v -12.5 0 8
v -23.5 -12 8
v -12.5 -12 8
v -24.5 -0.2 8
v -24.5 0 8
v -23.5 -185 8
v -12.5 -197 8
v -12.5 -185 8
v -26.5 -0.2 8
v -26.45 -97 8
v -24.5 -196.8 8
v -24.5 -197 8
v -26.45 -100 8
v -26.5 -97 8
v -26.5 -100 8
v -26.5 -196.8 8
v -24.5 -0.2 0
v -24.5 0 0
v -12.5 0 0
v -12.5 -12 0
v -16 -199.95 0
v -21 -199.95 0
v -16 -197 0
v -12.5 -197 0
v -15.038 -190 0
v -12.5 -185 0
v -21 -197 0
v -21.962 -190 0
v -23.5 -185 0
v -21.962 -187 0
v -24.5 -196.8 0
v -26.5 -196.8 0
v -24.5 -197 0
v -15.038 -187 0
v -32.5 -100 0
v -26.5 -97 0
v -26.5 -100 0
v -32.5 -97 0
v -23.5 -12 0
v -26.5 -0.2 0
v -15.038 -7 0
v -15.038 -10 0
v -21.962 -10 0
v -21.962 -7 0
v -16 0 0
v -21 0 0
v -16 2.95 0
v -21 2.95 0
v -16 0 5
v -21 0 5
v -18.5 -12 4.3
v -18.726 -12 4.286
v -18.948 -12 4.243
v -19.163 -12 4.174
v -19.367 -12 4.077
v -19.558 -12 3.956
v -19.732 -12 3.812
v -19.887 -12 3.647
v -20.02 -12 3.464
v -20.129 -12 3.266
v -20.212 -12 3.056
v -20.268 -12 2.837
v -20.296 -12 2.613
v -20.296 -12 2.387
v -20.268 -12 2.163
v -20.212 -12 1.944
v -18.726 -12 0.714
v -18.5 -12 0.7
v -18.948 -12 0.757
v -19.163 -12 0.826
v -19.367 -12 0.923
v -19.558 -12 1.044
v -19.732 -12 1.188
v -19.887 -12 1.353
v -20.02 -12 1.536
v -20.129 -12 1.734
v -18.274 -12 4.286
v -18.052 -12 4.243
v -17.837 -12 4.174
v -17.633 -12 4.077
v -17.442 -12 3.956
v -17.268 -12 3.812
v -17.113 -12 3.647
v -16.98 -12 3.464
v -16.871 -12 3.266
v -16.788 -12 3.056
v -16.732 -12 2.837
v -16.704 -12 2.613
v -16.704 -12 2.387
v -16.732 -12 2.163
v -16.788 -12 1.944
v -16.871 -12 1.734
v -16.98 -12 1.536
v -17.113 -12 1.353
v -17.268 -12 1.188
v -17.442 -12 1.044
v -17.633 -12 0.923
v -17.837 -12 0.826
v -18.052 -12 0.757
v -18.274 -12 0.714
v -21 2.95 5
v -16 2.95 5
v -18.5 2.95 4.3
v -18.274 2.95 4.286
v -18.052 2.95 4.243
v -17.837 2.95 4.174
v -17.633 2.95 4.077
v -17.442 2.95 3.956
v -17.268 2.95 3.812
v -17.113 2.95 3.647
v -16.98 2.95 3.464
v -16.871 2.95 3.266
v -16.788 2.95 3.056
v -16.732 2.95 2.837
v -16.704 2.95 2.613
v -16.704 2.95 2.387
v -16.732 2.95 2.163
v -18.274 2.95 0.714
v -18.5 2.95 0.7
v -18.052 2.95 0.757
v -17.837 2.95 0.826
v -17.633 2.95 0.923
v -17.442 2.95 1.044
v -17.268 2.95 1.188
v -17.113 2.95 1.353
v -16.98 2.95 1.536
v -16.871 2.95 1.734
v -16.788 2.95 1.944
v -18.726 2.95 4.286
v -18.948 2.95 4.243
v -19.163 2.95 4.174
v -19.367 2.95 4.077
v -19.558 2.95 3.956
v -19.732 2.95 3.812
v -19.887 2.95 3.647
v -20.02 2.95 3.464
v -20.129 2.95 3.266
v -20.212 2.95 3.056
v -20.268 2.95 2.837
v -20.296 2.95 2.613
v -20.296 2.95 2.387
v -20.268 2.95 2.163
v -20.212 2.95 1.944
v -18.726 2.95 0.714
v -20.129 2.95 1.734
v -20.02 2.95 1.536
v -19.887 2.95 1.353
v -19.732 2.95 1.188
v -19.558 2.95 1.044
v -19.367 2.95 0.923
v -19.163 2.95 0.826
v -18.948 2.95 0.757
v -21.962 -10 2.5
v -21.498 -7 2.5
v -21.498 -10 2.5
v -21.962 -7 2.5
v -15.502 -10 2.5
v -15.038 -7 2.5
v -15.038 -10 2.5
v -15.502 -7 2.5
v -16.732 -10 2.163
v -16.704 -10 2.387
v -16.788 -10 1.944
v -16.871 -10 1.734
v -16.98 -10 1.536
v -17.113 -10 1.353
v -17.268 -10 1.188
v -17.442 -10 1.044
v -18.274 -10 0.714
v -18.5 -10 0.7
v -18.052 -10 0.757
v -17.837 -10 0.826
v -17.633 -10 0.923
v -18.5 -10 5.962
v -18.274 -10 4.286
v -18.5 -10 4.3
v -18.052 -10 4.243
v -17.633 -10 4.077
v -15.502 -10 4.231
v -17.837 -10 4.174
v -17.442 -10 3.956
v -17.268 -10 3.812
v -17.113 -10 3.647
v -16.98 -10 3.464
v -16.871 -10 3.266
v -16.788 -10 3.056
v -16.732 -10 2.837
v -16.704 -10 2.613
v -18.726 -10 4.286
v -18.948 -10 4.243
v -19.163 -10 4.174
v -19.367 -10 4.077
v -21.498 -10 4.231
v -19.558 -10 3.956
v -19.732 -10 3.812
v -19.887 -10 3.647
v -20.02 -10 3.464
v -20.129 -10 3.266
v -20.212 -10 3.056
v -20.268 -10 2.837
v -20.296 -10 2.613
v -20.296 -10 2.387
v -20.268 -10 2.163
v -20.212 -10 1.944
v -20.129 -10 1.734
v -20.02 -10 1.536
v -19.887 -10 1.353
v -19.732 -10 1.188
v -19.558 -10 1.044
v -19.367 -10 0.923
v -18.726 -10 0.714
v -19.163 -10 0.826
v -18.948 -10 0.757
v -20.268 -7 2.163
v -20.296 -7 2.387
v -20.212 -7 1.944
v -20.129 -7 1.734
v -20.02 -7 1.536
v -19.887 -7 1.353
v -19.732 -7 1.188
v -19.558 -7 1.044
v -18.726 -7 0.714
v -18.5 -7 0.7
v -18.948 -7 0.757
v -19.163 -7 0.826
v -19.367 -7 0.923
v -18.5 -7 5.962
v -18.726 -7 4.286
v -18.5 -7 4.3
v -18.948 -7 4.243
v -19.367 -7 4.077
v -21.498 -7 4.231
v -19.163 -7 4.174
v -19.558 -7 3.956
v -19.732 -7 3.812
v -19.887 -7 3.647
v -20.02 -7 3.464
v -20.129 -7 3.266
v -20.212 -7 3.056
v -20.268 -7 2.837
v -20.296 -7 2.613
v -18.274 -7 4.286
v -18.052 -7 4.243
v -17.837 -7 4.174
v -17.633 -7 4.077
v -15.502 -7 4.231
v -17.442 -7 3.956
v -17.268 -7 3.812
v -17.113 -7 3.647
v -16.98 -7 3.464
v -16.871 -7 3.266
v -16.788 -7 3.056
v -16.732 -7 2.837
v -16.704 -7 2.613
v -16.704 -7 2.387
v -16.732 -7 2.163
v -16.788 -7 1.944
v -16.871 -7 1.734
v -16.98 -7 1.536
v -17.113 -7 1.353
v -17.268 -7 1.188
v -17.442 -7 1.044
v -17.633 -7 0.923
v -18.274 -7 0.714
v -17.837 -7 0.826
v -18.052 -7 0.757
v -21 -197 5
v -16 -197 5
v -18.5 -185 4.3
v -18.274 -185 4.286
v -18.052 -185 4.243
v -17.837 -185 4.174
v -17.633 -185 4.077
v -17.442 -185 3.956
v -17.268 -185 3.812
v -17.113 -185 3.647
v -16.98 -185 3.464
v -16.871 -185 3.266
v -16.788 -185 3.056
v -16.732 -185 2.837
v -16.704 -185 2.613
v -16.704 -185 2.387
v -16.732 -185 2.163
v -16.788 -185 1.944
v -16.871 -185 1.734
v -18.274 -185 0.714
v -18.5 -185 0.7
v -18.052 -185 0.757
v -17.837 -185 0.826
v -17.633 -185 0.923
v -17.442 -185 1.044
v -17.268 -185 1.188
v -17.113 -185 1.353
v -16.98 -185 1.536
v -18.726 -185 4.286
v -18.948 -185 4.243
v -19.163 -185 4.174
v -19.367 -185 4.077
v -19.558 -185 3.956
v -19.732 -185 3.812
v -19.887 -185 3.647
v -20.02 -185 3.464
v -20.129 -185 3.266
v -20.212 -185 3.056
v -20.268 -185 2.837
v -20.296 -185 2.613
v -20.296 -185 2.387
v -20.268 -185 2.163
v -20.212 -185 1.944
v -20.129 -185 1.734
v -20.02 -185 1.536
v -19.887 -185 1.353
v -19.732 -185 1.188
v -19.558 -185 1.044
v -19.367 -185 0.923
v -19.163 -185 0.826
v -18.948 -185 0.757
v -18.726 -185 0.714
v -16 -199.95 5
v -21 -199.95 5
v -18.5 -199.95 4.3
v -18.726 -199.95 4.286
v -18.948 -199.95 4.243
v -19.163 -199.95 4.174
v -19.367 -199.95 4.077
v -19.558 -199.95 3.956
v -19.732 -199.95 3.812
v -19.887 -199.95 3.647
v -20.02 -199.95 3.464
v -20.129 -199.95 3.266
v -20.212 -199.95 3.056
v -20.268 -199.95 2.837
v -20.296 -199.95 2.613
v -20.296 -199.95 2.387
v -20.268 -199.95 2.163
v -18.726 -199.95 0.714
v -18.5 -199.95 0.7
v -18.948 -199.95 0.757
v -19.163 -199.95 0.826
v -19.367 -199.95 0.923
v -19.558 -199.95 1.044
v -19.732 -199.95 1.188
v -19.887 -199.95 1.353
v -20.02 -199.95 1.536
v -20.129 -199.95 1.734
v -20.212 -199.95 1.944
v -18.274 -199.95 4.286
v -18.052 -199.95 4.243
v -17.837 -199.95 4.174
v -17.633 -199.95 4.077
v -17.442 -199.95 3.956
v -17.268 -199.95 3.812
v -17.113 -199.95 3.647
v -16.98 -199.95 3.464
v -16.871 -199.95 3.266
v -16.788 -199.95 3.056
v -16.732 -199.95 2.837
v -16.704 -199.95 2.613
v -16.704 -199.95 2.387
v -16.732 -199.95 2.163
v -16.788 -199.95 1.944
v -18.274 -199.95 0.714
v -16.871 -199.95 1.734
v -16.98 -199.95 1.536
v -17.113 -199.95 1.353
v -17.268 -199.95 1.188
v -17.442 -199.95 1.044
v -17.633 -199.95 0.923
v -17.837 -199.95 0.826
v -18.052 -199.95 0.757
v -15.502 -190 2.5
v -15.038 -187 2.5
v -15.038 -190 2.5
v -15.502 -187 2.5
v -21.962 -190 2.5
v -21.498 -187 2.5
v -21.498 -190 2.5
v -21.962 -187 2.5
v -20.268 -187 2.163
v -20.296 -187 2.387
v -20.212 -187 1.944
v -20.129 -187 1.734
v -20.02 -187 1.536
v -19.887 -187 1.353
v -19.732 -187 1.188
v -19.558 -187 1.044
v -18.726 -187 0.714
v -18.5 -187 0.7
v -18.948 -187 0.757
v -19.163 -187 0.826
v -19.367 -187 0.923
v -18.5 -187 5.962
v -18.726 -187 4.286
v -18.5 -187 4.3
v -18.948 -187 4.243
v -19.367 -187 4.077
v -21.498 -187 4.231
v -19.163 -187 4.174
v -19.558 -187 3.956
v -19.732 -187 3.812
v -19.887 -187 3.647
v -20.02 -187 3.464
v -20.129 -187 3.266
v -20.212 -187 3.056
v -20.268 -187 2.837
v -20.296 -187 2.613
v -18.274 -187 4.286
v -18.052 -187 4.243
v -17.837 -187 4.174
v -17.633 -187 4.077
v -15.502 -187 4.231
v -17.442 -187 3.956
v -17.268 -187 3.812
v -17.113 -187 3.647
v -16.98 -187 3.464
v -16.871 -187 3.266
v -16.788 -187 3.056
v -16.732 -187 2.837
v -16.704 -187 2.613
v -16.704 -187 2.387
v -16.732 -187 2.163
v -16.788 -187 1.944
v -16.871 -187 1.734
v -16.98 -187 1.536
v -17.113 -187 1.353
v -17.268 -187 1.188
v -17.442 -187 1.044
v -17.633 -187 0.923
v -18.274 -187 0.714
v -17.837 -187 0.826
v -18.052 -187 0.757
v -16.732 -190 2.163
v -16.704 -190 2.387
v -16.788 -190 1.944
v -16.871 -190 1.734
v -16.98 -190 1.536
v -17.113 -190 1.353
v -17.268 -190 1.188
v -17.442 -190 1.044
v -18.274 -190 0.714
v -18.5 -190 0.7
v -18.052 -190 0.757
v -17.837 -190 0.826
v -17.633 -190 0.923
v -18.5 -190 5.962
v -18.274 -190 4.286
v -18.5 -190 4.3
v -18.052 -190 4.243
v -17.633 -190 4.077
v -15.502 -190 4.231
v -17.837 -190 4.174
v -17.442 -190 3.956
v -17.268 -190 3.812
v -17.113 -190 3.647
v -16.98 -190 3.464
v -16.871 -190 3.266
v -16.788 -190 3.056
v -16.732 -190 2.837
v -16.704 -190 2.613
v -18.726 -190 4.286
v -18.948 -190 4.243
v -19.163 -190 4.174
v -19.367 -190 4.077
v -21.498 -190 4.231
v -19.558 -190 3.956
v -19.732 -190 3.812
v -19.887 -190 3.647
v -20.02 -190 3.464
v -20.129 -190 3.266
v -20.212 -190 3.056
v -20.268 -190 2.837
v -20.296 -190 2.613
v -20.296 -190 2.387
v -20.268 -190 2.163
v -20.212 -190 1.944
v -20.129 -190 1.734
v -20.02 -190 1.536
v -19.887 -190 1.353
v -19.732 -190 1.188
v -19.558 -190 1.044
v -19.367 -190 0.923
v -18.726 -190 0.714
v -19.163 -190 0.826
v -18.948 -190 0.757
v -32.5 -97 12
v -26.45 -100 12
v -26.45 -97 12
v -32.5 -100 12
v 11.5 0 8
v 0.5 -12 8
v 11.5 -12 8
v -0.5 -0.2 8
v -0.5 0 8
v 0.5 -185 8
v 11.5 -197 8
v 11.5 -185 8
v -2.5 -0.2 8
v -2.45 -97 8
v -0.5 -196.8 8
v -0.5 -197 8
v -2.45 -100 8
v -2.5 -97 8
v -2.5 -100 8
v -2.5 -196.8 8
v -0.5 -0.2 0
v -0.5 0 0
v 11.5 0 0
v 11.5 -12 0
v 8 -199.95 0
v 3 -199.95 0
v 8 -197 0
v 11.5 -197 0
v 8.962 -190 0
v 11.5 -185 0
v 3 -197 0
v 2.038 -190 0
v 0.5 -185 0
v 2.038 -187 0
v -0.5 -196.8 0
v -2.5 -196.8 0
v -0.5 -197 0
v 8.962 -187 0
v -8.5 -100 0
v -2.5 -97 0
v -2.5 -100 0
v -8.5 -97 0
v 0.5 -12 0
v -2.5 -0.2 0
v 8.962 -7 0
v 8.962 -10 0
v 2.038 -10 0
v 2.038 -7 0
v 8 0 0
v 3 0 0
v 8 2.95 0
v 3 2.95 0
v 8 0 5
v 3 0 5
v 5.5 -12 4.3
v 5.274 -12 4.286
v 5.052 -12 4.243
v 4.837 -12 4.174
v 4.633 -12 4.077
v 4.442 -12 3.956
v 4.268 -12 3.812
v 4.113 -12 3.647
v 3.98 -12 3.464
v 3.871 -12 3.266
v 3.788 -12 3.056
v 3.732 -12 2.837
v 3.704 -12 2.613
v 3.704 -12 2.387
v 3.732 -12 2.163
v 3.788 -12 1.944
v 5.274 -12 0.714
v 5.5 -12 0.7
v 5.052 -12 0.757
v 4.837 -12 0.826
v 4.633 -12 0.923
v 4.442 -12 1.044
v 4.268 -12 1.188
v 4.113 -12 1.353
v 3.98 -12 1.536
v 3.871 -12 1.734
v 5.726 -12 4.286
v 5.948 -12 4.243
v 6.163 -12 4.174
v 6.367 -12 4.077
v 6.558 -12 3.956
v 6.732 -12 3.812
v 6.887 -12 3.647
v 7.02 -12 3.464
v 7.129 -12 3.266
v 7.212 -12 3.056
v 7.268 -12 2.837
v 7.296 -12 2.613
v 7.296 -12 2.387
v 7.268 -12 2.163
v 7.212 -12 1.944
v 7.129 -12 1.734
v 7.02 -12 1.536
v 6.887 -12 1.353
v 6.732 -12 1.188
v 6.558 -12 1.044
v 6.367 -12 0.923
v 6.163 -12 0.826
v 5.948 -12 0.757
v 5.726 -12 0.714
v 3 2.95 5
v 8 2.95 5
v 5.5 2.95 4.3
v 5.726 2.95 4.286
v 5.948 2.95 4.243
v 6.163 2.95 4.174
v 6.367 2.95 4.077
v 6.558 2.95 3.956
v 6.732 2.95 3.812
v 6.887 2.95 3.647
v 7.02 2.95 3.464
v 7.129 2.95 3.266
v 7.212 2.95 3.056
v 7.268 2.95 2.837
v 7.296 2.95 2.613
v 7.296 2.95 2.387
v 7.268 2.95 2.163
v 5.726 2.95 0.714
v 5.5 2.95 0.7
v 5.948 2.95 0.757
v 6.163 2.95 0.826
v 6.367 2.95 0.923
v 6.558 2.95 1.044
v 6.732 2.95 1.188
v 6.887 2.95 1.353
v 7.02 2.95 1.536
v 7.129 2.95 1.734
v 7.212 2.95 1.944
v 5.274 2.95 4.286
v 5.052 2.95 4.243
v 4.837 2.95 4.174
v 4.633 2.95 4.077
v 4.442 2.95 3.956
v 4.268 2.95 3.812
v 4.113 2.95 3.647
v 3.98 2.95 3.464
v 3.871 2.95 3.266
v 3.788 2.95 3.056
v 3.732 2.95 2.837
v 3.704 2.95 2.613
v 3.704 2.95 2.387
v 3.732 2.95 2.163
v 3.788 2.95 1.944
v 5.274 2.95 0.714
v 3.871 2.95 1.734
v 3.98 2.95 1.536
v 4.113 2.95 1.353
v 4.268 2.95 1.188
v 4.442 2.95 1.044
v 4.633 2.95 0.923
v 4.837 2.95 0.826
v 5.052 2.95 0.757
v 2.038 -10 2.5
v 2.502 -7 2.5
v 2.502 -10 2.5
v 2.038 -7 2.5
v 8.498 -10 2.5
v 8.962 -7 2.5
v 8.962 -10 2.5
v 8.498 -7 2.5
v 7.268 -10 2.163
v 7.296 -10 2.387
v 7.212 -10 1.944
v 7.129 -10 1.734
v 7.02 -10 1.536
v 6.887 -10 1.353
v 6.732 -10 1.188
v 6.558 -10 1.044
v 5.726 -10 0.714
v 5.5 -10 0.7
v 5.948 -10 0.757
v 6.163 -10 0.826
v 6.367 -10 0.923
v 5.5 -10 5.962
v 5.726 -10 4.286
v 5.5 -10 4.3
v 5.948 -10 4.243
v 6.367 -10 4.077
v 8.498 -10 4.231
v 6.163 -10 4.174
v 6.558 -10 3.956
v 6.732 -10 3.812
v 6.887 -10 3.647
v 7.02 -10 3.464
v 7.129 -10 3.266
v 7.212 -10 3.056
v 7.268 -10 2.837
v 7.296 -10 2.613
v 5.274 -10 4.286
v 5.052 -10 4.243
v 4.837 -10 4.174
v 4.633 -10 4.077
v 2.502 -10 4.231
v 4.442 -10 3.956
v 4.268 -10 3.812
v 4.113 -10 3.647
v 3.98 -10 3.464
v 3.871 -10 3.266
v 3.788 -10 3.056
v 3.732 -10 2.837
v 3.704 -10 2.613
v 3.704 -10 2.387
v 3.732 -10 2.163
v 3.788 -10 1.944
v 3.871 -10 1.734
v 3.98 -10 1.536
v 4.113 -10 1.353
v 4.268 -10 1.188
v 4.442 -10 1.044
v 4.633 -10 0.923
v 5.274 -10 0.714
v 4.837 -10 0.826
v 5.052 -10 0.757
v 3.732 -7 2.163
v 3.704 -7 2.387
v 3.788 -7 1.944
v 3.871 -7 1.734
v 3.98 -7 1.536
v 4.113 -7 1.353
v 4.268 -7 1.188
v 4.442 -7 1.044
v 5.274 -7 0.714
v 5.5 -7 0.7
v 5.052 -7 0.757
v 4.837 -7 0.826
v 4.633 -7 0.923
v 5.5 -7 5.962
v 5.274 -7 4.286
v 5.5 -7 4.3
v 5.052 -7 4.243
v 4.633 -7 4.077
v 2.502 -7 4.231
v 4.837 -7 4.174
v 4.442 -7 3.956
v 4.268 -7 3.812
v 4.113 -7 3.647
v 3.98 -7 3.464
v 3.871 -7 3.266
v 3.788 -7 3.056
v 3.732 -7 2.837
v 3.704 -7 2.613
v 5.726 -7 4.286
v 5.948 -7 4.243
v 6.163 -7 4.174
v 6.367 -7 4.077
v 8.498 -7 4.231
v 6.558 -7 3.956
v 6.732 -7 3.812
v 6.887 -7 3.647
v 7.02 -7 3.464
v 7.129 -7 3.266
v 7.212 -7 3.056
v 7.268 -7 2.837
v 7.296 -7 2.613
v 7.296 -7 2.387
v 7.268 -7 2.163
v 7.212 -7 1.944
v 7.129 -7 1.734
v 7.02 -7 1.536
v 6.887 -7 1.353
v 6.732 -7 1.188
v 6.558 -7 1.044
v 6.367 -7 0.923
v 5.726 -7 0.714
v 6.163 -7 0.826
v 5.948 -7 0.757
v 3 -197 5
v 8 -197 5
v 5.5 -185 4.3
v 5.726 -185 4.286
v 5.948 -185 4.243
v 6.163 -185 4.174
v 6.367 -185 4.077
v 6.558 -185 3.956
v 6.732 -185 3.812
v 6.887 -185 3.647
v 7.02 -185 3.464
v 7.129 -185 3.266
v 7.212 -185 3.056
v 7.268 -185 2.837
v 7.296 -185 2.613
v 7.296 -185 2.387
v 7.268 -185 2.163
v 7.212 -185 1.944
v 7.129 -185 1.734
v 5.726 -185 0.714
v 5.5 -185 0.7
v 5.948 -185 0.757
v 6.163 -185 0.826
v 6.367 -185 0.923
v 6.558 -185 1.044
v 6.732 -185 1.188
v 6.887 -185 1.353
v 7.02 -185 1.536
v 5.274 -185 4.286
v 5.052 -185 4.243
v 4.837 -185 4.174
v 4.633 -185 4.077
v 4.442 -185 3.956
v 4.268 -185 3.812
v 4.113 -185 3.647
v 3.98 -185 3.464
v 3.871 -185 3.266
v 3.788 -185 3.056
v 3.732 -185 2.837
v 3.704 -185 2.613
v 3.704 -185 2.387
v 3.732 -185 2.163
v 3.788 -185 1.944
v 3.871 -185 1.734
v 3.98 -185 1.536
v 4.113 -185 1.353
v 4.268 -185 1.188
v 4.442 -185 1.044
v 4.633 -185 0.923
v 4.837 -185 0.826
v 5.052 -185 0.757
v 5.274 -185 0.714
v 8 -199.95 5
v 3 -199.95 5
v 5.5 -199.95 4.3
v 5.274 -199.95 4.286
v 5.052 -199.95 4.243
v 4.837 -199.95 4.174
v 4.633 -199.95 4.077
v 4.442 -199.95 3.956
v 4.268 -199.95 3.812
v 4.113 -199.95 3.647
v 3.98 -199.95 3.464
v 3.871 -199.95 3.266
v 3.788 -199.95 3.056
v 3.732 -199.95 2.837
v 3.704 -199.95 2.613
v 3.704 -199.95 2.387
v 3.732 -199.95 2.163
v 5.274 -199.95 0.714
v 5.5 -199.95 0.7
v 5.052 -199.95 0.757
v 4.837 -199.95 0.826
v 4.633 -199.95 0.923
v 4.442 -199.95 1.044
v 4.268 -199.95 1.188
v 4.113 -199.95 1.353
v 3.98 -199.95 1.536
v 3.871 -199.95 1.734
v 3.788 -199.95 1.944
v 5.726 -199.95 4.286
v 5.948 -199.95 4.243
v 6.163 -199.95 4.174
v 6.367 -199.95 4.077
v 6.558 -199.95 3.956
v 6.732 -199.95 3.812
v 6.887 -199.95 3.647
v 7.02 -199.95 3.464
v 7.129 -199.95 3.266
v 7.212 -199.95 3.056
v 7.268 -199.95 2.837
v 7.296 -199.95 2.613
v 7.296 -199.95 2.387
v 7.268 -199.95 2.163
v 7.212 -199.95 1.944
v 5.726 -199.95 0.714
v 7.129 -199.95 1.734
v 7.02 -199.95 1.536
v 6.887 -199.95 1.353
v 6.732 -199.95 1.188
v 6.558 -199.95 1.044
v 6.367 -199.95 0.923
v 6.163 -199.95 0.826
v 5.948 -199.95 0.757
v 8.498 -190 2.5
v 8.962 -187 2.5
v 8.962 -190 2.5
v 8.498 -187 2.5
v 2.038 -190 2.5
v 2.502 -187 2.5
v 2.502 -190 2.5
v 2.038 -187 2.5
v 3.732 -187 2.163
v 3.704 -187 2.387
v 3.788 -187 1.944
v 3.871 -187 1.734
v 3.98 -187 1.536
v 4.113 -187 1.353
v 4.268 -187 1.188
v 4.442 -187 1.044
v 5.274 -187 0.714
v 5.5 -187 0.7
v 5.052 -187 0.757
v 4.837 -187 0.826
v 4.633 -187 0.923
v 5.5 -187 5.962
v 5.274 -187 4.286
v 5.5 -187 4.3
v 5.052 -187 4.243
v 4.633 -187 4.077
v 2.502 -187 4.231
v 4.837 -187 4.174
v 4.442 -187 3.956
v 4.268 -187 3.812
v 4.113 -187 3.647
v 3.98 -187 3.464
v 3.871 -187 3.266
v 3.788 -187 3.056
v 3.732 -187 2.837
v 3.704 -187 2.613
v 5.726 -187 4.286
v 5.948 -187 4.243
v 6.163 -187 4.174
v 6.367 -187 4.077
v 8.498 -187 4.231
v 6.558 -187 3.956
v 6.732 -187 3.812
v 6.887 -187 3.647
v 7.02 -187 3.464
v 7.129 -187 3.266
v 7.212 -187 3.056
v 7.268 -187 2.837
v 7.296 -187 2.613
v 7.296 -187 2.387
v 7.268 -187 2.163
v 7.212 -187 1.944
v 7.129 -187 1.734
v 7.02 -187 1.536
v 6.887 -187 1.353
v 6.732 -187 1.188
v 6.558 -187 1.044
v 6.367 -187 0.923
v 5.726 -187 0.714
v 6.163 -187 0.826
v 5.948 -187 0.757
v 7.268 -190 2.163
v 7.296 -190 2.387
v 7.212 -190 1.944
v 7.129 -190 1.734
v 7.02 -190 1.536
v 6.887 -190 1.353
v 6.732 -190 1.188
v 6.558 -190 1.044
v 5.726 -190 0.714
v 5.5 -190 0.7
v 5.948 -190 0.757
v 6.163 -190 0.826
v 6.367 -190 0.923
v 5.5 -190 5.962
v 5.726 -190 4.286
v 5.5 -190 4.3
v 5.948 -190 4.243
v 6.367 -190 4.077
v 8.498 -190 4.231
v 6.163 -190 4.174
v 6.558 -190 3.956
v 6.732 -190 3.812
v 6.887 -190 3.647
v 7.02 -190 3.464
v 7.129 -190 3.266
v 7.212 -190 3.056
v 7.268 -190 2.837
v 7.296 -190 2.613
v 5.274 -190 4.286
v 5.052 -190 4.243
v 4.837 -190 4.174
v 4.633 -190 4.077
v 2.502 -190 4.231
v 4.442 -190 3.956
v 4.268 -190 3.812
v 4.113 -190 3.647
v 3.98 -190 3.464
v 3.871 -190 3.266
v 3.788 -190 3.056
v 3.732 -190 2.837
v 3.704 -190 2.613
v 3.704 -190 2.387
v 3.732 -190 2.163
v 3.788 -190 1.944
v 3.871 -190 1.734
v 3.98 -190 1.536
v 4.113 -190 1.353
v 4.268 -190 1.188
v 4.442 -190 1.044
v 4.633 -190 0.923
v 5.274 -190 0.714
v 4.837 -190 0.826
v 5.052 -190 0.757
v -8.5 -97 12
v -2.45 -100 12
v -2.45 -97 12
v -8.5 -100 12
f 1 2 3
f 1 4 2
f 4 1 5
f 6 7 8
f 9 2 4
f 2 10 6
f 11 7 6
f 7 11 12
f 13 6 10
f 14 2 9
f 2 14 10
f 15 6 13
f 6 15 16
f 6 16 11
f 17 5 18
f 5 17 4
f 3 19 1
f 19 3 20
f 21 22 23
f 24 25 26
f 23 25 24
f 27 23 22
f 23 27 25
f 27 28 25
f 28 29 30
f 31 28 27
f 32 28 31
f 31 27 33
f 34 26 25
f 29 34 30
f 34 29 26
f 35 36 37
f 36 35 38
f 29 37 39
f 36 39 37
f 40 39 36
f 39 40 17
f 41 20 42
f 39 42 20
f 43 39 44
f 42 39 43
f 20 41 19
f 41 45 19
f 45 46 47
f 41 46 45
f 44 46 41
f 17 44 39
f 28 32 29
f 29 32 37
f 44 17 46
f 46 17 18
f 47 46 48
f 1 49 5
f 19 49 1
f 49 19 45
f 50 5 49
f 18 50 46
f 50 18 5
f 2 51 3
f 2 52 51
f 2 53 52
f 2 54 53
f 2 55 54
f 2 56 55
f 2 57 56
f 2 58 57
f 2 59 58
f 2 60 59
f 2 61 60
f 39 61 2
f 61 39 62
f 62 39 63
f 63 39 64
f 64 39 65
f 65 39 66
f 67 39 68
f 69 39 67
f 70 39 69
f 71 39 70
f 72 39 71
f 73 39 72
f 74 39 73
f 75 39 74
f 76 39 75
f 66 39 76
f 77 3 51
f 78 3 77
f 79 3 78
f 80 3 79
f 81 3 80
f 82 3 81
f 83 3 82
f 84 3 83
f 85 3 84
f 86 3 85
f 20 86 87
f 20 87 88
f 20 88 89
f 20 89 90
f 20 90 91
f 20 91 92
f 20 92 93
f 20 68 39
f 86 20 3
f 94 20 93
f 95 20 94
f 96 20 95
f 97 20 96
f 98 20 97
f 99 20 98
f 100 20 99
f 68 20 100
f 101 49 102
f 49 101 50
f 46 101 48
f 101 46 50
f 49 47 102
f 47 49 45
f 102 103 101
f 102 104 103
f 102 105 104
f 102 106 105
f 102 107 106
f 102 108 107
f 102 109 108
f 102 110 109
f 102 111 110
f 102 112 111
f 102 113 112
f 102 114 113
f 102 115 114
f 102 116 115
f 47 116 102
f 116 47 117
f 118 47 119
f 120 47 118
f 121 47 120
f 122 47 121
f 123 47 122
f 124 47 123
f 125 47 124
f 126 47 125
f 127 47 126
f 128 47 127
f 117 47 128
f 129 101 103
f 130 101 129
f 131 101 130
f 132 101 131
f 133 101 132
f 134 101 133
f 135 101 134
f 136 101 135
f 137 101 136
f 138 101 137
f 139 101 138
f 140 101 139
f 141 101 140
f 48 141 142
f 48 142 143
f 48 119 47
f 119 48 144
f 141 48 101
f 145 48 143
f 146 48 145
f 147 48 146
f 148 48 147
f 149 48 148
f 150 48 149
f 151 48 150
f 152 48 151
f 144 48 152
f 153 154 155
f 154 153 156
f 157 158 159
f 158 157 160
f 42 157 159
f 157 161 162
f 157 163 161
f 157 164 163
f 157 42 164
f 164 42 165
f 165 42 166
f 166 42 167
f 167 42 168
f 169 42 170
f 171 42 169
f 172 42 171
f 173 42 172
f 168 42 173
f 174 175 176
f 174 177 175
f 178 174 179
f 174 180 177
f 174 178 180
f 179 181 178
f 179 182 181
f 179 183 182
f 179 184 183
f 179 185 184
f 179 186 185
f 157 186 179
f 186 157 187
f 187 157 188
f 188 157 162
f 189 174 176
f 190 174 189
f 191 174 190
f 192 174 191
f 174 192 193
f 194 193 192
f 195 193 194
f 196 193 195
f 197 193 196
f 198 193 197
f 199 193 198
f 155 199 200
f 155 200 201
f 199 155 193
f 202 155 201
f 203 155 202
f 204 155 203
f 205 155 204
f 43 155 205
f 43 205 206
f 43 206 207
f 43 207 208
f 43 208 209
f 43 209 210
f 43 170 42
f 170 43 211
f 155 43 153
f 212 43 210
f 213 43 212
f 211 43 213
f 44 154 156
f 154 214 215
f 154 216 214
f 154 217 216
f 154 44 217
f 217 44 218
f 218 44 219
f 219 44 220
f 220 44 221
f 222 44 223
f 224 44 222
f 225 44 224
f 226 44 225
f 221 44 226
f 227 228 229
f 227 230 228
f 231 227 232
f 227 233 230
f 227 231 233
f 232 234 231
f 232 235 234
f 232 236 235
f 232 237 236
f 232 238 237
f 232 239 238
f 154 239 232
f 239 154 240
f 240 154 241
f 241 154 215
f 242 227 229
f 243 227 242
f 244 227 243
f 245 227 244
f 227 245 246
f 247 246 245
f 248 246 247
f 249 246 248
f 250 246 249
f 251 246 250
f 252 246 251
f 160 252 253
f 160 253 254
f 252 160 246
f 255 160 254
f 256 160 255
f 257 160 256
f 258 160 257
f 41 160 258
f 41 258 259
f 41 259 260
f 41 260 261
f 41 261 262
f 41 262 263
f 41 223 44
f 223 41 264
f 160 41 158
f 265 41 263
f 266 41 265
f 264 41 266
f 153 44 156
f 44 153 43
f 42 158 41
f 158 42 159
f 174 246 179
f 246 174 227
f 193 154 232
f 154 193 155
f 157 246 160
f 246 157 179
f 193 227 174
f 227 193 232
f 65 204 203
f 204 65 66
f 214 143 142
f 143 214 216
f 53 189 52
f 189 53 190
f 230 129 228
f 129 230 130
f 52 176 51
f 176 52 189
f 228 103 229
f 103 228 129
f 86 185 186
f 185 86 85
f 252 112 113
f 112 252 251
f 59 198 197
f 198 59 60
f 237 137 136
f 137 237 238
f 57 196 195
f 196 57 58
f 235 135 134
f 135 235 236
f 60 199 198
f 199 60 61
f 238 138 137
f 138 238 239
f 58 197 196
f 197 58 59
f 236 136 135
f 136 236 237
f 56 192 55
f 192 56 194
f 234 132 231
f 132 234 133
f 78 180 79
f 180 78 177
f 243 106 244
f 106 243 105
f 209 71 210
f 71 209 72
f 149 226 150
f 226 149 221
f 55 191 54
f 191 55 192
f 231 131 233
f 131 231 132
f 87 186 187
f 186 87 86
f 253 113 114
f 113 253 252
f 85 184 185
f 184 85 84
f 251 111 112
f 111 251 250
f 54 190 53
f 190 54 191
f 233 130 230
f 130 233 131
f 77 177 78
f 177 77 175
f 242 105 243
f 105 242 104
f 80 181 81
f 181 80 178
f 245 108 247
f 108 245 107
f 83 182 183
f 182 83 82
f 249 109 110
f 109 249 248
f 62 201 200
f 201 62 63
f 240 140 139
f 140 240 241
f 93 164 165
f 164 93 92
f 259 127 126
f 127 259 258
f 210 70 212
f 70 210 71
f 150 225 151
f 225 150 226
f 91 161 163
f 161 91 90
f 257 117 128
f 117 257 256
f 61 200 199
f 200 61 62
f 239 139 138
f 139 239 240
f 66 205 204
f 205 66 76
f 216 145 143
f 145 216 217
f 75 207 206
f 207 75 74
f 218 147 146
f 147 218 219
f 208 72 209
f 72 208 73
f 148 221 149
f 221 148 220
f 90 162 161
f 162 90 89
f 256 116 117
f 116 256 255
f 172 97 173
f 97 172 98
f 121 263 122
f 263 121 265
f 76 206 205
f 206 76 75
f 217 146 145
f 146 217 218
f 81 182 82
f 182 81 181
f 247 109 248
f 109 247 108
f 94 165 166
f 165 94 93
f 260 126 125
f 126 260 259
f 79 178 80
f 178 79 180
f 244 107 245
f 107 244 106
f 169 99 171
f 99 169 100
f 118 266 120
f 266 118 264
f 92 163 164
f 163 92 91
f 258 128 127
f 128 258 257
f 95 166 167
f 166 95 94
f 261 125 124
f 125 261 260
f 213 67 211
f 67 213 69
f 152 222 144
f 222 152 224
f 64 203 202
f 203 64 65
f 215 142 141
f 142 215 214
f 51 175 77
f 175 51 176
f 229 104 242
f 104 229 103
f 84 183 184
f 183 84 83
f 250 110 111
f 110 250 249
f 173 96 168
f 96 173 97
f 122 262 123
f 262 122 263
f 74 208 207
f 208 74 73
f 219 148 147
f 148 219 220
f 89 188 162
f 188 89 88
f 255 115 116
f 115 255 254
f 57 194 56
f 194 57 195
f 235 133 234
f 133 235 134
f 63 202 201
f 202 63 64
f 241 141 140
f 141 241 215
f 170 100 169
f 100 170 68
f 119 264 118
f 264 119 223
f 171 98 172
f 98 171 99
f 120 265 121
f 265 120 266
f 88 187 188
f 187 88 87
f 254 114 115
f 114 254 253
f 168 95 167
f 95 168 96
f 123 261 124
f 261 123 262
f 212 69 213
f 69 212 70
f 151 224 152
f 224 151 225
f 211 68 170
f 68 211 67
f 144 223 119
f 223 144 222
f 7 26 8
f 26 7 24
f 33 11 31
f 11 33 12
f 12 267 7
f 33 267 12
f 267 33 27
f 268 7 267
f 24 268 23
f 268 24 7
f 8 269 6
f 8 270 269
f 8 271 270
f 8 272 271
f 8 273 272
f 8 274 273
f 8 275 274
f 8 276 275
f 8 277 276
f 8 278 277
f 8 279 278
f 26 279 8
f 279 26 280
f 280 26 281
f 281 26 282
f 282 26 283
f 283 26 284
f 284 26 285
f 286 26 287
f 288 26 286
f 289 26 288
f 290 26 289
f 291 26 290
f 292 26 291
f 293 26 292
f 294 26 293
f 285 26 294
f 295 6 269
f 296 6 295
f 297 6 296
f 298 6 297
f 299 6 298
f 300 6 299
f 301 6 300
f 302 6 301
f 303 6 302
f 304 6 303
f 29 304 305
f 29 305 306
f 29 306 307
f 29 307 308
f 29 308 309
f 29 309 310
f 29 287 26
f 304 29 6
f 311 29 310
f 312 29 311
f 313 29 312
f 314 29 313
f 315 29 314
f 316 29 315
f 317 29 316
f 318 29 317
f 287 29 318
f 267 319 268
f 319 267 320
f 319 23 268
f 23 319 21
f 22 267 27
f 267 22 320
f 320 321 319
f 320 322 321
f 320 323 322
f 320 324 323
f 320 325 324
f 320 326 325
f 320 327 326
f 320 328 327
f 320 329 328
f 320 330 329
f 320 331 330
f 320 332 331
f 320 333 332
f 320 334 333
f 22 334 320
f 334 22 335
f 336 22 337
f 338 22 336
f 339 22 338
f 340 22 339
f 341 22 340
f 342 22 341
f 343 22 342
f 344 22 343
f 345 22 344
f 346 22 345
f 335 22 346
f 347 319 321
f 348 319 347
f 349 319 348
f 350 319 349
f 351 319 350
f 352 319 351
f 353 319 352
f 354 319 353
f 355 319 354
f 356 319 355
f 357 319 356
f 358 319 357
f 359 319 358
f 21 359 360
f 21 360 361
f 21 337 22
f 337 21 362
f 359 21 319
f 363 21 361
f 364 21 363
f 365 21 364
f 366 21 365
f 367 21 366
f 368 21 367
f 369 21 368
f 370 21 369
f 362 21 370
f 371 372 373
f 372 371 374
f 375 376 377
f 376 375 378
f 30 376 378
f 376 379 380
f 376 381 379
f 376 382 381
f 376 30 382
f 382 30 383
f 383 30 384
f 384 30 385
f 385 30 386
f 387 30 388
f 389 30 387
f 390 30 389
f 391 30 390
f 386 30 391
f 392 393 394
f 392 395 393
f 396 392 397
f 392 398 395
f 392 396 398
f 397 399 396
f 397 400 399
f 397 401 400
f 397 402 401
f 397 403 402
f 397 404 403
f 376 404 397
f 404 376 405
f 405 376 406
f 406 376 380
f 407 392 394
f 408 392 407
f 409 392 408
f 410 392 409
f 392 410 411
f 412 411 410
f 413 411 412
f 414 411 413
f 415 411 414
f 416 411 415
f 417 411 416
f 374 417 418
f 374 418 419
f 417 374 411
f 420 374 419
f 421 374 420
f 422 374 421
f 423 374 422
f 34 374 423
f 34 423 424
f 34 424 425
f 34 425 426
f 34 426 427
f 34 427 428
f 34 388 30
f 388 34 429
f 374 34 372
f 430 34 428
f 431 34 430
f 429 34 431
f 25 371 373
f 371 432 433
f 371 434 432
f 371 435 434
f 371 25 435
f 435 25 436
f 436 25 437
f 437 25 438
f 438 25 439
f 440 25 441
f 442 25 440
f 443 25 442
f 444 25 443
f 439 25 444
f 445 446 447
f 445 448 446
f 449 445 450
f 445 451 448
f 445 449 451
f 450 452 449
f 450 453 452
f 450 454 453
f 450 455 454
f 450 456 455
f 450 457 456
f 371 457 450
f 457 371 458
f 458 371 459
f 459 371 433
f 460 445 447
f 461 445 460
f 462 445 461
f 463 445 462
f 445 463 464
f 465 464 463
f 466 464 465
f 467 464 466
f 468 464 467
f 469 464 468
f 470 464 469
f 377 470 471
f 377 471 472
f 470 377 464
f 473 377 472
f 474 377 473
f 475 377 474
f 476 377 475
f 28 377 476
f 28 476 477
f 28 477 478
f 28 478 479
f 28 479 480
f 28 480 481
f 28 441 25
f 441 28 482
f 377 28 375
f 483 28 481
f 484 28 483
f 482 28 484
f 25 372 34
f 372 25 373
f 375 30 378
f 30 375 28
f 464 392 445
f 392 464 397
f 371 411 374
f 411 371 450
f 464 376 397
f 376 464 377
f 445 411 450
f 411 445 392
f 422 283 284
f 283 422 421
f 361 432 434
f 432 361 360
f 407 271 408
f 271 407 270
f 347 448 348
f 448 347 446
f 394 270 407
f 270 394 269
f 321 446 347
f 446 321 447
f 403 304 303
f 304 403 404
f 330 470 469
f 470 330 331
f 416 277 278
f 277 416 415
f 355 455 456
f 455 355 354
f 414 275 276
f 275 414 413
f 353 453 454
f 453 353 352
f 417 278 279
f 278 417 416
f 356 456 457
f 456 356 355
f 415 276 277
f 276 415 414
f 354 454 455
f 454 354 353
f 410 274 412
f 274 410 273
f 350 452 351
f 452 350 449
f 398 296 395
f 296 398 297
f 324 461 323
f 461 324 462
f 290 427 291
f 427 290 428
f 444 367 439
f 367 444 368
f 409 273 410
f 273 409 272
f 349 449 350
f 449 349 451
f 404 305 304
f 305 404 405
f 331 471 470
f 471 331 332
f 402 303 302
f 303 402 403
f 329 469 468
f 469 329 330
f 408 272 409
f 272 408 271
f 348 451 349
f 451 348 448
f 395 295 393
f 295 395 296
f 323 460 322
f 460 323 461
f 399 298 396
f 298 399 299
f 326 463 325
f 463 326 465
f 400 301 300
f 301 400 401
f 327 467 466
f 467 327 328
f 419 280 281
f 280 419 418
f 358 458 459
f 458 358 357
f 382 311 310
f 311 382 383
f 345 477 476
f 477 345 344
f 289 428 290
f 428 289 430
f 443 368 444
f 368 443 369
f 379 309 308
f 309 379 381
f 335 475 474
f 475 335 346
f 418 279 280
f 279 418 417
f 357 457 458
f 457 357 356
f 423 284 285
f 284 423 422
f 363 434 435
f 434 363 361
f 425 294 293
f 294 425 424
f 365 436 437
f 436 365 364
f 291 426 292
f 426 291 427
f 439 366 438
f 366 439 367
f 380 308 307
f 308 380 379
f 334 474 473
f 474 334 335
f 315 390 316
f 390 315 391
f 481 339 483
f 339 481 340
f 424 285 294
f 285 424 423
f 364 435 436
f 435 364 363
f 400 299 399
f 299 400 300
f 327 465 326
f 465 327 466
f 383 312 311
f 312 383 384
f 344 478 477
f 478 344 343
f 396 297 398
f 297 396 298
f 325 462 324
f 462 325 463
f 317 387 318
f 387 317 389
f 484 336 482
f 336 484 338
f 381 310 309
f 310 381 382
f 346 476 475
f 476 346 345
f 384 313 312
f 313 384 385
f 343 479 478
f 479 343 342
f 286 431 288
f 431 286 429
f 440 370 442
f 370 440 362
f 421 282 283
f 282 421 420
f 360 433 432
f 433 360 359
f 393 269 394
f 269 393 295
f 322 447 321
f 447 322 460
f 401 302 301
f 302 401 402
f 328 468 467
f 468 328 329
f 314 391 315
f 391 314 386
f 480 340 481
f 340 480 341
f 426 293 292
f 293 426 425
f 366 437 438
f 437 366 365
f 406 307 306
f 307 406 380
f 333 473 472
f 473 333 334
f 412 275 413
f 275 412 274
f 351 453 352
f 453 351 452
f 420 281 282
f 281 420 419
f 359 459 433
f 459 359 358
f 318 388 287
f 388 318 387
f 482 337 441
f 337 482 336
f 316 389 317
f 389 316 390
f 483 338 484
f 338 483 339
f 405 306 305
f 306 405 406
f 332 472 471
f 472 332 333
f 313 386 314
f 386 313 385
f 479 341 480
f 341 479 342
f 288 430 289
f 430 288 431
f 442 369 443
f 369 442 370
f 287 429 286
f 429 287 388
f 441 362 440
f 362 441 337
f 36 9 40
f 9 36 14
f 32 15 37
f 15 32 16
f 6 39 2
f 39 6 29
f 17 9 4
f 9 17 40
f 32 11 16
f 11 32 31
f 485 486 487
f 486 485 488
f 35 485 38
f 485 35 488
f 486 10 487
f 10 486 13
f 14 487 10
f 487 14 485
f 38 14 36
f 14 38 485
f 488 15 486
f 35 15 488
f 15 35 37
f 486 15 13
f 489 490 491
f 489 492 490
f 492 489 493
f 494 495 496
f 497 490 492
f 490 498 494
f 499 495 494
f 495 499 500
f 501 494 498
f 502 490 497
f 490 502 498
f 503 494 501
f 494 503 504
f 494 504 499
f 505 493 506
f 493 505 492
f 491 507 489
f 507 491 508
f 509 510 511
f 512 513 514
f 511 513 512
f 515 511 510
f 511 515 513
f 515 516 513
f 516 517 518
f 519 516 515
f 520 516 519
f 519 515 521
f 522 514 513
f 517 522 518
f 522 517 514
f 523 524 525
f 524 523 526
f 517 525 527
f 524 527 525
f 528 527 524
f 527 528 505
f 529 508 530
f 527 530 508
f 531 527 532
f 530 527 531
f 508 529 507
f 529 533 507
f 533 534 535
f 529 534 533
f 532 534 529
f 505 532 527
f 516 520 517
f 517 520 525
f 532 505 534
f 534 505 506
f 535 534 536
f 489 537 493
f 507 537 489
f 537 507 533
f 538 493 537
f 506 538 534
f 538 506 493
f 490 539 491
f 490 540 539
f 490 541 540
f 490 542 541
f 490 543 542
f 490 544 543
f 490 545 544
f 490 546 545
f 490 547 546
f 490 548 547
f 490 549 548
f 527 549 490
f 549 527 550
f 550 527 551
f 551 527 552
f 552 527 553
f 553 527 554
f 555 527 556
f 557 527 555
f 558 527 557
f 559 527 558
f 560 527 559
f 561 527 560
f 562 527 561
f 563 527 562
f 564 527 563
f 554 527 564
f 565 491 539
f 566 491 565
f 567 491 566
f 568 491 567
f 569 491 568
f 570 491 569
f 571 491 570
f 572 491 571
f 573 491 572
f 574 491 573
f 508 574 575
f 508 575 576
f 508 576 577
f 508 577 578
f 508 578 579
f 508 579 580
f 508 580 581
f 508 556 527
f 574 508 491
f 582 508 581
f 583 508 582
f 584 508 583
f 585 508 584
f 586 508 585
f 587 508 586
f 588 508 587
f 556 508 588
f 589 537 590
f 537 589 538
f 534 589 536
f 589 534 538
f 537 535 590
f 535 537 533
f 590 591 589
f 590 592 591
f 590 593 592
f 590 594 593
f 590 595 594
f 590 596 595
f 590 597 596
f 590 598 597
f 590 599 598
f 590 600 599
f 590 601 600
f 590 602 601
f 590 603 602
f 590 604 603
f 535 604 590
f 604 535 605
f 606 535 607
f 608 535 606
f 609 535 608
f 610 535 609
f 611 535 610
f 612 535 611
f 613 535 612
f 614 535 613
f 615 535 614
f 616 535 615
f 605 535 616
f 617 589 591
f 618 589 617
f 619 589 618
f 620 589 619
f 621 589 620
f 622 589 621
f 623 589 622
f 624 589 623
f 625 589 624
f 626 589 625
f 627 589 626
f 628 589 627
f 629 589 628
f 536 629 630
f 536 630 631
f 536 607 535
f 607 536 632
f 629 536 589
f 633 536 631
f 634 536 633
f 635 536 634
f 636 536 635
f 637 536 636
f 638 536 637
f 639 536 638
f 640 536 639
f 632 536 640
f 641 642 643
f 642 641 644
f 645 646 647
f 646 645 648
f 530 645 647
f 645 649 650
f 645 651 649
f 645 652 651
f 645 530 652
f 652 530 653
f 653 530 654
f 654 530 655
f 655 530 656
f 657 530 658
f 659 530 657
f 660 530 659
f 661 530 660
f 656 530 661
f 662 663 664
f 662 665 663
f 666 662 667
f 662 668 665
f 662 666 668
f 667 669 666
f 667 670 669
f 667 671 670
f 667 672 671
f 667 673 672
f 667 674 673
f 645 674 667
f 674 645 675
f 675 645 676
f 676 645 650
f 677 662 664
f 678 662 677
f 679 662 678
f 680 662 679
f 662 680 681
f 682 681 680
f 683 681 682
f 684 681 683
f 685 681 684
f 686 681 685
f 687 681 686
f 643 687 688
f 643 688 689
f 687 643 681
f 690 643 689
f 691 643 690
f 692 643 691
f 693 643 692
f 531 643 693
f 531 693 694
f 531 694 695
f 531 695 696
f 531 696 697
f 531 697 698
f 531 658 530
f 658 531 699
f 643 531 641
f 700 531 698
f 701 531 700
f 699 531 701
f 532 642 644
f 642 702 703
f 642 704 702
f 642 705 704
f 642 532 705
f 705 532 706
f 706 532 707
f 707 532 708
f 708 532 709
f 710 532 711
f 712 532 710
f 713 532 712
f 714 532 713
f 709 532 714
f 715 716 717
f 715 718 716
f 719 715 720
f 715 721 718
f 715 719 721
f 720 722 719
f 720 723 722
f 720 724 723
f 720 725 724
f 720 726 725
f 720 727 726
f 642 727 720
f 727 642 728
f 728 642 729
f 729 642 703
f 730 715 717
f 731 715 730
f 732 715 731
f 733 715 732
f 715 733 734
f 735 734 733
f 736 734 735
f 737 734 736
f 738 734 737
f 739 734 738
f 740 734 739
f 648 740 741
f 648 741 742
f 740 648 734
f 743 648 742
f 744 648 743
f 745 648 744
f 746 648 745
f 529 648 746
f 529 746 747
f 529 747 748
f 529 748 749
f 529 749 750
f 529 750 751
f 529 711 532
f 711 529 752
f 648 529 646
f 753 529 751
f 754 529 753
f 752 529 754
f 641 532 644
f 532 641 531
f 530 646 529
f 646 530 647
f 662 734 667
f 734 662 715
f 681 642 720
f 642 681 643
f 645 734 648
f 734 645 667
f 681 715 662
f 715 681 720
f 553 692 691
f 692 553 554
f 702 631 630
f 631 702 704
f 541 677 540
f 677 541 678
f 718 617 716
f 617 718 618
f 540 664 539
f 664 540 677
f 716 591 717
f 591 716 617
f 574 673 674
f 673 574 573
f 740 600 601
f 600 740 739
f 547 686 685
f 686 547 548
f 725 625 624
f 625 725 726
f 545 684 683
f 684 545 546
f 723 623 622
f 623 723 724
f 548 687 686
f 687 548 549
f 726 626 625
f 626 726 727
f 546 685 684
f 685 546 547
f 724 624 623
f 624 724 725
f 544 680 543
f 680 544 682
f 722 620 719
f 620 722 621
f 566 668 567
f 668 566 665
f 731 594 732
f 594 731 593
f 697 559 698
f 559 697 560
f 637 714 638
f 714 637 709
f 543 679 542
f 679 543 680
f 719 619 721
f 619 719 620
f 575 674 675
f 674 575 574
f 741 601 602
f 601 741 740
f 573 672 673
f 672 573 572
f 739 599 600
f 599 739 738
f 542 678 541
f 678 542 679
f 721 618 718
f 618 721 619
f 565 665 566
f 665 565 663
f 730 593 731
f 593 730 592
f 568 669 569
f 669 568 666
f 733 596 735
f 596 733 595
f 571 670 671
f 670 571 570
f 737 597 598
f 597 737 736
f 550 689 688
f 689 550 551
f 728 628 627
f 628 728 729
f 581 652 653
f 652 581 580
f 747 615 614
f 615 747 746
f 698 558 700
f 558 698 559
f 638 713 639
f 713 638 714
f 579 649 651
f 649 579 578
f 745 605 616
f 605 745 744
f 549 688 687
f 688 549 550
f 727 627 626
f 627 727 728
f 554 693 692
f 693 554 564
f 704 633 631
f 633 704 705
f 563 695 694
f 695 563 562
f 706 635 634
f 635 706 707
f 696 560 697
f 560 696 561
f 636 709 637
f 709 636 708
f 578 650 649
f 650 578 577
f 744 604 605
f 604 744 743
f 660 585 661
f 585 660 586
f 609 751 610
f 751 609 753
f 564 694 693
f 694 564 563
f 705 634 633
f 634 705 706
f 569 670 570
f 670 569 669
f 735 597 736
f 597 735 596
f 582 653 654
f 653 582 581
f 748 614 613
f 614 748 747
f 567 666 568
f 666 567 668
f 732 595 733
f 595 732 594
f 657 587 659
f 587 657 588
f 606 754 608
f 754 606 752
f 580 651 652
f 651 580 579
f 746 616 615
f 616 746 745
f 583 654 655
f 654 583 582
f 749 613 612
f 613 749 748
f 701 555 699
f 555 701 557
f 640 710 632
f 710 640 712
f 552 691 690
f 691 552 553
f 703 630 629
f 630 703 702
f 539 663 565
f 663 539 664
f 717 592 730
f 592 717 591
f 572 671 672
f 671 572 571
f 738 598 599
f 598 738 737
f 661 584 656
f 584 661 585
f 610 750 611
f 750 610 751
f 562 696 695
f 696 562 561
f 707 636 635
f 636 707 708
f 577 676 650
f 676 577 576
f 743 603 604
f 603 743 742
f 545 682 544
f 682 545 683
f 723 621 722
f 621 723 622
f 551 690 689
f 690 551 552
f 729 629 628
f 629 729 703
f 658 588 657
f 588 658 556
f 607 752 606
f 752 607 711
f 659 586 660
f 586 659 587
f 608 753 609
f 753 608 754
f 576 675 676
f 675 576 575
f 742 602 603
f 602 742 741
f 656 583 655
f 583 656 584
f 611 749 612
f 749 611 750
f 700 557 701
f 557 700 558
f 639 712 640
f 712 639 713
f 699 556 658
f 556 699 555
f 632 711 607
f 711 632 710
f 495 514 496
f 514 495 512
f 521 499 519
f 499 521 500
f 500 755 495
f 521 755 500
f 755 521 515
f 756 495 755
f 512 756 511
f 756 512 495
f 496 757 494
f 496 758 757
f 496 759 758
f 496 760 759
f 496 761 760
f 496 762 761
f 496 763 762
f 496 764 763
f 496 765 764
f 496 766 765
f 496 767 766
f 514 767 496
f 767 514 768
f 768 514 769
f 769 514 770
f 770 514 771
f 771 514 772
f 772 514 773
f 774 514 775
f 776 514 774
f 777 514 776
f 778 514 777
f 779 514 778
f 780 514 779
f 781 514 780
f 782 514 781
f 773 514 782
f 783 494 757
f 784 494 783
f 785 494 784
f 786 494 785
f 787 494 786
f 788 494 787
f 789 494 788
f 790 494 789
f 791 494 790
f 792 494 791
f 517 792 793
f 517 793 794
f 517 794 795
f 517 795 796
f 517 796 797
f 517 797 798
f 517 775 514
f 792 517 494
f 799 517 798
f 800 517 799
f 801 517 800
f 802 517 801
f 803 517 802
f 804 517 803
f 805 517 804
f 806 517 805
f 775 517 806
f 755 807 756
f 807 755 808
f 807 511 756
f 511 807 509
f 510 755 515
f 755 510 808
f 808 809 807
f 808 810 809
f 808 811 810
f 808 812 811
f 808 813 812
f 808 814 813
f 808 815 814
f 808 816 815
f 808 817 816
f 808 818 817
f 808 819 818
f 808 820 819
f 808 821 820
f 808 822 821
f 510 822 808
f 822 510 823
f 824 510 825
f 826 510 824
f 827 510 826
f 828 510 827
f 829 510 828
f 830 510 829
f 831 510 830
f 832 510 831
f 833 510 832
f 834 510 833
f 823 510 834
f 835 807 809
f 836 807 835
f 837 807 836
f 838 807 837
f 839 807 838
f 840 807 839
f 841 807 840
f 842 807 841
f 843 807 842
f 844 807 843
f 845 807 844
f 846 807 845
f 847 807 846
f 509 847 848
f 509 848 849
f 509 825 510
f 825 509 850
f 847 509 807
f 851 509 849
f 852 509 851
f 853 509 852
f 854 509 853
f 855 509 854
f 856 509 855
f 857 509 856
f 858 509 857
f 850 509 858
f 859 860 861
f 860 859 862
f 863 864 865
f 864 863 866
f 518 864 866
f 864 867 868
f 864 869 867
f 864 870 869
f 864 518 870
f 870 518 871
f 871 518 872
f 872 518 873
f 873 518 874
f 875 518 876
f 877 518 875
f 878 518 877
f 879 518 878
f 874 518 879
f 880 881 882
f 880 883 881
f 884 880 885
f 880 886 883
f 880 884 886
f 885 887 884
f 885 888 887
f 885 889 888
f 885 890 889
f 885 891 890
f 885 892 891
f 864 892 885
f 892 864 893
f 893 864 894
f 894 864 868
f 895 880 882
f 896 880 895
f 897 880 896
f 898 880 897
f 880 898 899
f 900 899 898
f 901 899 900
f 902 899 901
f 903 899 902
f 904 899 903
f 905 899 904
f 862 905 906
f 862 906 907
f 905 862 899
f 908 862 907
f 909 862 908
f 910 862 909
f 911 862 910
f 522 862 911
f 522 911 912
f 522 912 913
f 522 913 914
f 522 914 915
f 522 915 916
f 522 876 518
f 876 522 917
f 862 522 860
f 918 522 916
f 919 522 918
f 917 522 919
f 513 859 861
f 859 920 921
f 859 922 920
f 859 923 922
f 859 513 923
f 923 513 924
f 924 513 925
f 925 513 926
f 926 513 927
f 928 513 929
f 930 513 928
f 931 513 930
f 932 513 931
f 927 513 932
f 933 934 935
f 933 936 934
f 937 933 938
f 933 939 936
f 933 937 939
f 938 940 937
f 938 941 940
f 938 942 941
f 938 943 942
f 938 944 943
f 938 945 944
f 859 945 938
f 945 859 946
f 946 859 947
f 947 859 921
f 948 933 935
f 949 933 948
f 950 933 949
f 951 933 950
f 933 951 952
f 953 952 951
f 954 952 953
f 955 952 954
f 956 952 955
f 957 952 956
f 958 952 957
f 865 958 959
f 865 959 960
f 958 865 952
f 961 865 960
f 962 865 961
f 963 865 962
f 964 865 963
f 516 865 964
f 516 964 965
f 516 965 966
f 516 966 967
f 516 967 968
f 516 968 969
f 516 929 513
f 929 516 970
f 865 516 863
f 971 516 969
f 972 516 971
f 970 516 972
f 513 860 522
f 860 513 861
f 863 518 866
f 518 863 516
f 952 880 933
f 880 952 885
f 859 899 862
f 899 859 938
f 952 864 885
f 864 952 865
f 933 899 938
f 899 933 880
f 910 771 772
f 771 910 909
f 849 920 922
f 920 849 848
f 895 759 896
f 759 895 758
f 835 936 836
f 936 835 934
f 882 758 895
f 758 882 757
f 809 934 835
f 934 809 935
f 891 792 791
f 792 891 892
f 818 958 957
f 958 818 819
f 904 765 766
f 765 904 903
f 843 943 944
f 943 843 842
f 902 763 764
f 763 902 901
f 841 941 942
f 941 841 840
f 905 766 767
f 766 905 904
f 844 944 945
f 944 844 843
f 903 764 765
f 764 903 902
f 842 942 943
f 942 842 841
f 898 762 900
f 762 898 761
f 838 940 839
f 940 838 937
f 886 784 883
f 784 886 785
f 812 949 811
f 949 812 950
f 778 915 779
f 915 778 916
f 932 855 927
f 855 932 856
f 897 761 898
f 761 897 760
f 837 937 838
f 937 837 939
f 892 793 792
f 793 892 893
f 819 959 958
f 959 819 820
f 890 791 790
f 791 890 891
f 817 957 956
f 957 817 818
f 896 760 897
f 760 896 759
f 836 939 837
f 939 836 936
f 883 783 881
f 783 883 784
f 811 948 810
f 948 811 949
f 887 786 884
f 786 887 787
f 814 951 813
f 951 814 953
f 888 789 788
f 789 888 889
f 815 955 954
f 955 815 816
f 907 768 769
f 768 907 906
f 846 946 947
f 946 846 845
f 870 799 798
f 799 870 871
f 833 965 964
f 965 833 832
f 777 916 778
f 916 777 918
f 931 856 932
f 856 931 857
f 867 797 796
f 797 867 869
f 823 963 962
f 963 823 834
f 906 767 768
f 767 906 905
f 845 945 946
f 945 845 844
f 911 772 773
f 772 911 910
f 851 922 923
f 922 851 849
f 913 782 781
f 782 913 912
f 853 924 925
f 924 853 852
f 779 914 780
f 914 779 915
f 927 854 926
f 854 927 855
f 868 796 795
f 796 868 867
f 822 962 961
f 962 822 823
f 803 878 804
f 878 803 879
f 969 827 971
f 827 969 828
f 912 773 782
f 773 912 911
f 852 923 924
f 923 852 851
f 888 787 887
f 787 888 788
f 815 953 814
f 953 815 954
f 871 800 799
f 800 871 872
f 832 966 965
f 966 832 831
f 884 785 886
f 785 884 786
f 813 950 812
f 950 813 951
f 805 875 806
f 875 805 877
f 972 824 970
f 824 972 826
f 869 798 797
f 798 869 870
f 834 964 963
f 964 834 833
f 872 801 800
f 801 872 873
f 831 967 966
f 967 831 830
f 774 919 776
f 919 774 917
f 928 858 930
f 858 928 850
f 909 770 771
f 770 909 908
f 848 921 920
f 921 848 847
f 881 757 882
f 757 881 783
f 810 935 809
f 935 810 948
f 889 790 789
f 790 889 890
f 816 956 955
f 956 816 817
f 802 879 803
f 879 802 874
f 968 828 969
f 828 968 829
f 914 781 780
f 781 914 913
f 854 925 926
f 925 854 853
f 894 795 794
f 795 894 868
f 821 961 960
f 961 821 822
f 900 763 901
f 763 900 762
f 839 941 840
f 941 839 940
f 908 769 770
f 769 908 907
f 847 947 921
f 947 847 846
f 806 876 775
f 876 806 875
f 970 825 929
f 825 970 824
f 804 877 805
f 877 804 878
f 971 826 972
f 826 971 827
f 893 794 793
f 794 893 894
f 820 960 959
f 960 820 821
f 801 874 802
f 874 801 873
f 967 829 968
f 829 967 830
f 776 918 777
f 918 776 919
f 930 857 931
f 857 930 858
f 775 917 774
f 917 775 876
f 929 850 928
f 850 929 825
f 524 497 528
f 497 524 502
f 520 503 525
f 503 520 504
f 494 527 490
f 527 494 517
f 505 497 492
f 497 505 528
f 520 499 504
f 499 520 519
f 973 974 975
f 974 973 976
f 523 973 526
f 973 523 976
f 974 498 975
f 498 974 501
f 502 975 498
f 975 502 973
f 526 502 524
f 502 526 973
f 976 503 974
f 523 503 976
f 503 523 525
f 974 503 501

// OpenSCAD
$fn = 50;

difference() {
	union() {
		translate(v = [-12.0, 0, 0]) {
			rotate(a = [0, 0, 0]) {
				difference() {
					union() {
						translate(v = [0, 0, 2.5]) {
							rotate(a = [0, -90, 0]) {
								difference() {
									union() {
										translate(v = [0, 0, 0]) {
											rotate(a = [0, 0, 0]) {
												difference() {
													union() {
														translate(v = [-2.5, -12.0, 0.5]) {
															cube(size = [8.0, 12.0, 12.0]);
														}
														translate(v = [-2.5, -0.05, 4.0]) {
															cube(size = [5.0, 3.0, 5.0]);
														}
													}
													union() {
														translate(v = [0, -7.0, 6.5]) {
															rotate(a = [90, 0, 0]) {
																difference() {
																	union() {
																		translate(v = [-20.0, -3.4619999999999997, 0]) {
																			cube(size = [20, 6.9239999999999995, 3]);
																		}
																		linear_extrude(height = 3) {
																			polygon(points = [[3.4619999999999997, 0.0], [1.7310000000000003, 2.9981799479017264], [-1.7309999999999992, 2.9981799479017264], [-3.4619999999999997, 4.2397272186481365e-16], [-1.7310000000000014, -2.998179947901726], [1.7309999999999977, -2.9981799479017277]]);
																		}
																	}
																	union();
																}
															}
														}
														translate(v = [0, 3.0500000000000003, 6.5]) {
															rotate(a = [90, 0, 0]) {
																cylinder(h = 22.95, r = 1.8);
															}
														}
													}
												}
											}
										}
										translate(v = [0, -197.0, 13.0]) {
											rotate(a = [180, 0, 0]) {
												difference() {
													union() {
														translate(v = [-2.5, -12.0, 0.5]) {
															cube(size = [8.0, 12.0, 12.0]);
														}
														translate(v = [-2.5, -0.05, 4.0]) {
															cube(size = [5.0, 3.0, 5.0]);
														}
													}
													union() {
														translate(v = [0, -7.0, 6.5]) {
															rotate(a = [90, 0, 0]) {
																difference() {
																	union() {
																		translate(v = [-20.0, -3.4619999999999997, 0]) {
																			cube(size = [20, 6.9239999999999995, 3]);
																		}
																		linear_extrude(height = 3) {
																			polygon(points = [[3.4619999999999997, 0.0], [1.7310000000000003, 2.9981799479017264], [-1.7309999999999992, 2.9981799479017264], [-3.4619999999999997, 4.2397272186481365e-16], [-1.7310000000000014, -2.998179947901726], [1.7309999999999977, -2.9981799479017277]]);
																		}
																	}
																	union();
																}
															}
														}
														translate(v = [0, 3.0500000000000003, 6.5]) {
															rotate(a = [90, 0, 0]) {
																cylinder(h = 22.95, r = 1.8);
															}
														}
													}
												}
											}
										}
										translate(v = [-2.5, -196.8, 11.5]) {
											cube(size = [8.0, 196.6, 3.0]);
										}
										translate(v = [-2.5, -100.0, 14.45]) {
											cube(size = [12.0, 3.0, 6.05]);
										}
									}
									union();
								}
							}
						}
					}
					union();
				}
			}
		}
		translate(v = [12.0, 0, 0]) {
			rotate(a = [0, 0, 0]) {
				difference() {
					union() {
						translate(v = [0, 0, 2.5]) {
							rotate(a = [0, -90, 0]) {
								difference() {
									union() {
										translate(v = [0, 0, 0]) {
											rotate(a = [0, 0, 0]) {
												difference() {
													union() {
														translate(v = [-2.5, -12.0, 0.5]) {
															cube(size = [8.0, 12.0, 12.0]);
														}
														translate(v = [-2.5, -0.05, 4.0]) {
															cube(size = [5.0, 3.0, 5.0]);
														}
													}
													union() {
														translate(v = [0, -7.0, 6.5]) {
															rotate(a = [90, 0, 0]) {
																difference() {
																	union() {
																		translate(v = [-20.0, -3.4619999999999997, 0]) {
																			cube(size = [20, 6.9239999999999995, 3]);
																		}
																		linear_extrude(height = 3) {
																			polygon(points = [[3.4619999999999997, 0.0], [1.7310000000000003, 2.9981799479017264], [-1.7309999999999992, 2.9981799479017264], [-3.4619999999999997, 4.2397272186481365e-16], [-1.7310000000000014, -2.998179947901726], [1.7309999999999977, -2.9981799479017277]]);
																		}
																	}
																	union();
																}
															}
														}
														translate(v = [0, 3.0500000000000003, 6.5]) {
															rotate(a = [90, 0, 0]) {
																cylinder(h = 22.95, r = 1.8);
															}
														}
													}
												}
											}
										}
										translate(v = [0, -197.0, 13.0]) {
											rotate(a = [180, 0, 0]) {
												difference() {
													union() {
														translate(v = [-2.5, -12.0, 0.5]) {
															cube(size = [8.0, 12.0, 12.0]);
														}
														translate(v = [-2.5, -0.05, 4.0]) {
															cube(size = [5.0, 3.0, 5.0]);
														}
													}
													union() {
														translate(v = [0, -7.0, 6.5]) {
															rotate(a = [90, 0, 0]) {
																difference() {
																	union() {
																		translate(v = [-20.0, -3.4619999999999997, 0]) {
																			cube(size = [20, 6.9239999999999995, 3]);
																		}
																		linear_extrude(height = 3) {
																			polygon(points = [[3.4619999999999997, 0.0], [1.7310000000000003, 2.9981799479017264], [-1.7309999999999992, 2.9981799479017264], [-3.4619999999999997, 4.2397272186481365e-16], [-1.7310000000000014, -2.998179947901726], [1.7309999999999977, -2.9981799479017277]]);
																		}
																	}
																	union();
																}
															}
														}
														translate(v = [0, 3.0500000000000003, 6.5]) {
															rotate(a = [90, 0, 0]) {
																cylinder(h = 22.95, r = 1.8);
															}
														}
													}
												}
											}
										}
										translate(v = [-2.5, -196.8, 11.5]) {
											cube(size = [8.0, 196.6, 3.0]);
										}
										translate(v = [-2.5, -100.0, 14.45]) {
											cube(size = [12.0, 3.0, 6.05]);
										}
									}
									union();
								}
							}
						}
					}
					union();
				}
			}
		}
	}
	union();
}
